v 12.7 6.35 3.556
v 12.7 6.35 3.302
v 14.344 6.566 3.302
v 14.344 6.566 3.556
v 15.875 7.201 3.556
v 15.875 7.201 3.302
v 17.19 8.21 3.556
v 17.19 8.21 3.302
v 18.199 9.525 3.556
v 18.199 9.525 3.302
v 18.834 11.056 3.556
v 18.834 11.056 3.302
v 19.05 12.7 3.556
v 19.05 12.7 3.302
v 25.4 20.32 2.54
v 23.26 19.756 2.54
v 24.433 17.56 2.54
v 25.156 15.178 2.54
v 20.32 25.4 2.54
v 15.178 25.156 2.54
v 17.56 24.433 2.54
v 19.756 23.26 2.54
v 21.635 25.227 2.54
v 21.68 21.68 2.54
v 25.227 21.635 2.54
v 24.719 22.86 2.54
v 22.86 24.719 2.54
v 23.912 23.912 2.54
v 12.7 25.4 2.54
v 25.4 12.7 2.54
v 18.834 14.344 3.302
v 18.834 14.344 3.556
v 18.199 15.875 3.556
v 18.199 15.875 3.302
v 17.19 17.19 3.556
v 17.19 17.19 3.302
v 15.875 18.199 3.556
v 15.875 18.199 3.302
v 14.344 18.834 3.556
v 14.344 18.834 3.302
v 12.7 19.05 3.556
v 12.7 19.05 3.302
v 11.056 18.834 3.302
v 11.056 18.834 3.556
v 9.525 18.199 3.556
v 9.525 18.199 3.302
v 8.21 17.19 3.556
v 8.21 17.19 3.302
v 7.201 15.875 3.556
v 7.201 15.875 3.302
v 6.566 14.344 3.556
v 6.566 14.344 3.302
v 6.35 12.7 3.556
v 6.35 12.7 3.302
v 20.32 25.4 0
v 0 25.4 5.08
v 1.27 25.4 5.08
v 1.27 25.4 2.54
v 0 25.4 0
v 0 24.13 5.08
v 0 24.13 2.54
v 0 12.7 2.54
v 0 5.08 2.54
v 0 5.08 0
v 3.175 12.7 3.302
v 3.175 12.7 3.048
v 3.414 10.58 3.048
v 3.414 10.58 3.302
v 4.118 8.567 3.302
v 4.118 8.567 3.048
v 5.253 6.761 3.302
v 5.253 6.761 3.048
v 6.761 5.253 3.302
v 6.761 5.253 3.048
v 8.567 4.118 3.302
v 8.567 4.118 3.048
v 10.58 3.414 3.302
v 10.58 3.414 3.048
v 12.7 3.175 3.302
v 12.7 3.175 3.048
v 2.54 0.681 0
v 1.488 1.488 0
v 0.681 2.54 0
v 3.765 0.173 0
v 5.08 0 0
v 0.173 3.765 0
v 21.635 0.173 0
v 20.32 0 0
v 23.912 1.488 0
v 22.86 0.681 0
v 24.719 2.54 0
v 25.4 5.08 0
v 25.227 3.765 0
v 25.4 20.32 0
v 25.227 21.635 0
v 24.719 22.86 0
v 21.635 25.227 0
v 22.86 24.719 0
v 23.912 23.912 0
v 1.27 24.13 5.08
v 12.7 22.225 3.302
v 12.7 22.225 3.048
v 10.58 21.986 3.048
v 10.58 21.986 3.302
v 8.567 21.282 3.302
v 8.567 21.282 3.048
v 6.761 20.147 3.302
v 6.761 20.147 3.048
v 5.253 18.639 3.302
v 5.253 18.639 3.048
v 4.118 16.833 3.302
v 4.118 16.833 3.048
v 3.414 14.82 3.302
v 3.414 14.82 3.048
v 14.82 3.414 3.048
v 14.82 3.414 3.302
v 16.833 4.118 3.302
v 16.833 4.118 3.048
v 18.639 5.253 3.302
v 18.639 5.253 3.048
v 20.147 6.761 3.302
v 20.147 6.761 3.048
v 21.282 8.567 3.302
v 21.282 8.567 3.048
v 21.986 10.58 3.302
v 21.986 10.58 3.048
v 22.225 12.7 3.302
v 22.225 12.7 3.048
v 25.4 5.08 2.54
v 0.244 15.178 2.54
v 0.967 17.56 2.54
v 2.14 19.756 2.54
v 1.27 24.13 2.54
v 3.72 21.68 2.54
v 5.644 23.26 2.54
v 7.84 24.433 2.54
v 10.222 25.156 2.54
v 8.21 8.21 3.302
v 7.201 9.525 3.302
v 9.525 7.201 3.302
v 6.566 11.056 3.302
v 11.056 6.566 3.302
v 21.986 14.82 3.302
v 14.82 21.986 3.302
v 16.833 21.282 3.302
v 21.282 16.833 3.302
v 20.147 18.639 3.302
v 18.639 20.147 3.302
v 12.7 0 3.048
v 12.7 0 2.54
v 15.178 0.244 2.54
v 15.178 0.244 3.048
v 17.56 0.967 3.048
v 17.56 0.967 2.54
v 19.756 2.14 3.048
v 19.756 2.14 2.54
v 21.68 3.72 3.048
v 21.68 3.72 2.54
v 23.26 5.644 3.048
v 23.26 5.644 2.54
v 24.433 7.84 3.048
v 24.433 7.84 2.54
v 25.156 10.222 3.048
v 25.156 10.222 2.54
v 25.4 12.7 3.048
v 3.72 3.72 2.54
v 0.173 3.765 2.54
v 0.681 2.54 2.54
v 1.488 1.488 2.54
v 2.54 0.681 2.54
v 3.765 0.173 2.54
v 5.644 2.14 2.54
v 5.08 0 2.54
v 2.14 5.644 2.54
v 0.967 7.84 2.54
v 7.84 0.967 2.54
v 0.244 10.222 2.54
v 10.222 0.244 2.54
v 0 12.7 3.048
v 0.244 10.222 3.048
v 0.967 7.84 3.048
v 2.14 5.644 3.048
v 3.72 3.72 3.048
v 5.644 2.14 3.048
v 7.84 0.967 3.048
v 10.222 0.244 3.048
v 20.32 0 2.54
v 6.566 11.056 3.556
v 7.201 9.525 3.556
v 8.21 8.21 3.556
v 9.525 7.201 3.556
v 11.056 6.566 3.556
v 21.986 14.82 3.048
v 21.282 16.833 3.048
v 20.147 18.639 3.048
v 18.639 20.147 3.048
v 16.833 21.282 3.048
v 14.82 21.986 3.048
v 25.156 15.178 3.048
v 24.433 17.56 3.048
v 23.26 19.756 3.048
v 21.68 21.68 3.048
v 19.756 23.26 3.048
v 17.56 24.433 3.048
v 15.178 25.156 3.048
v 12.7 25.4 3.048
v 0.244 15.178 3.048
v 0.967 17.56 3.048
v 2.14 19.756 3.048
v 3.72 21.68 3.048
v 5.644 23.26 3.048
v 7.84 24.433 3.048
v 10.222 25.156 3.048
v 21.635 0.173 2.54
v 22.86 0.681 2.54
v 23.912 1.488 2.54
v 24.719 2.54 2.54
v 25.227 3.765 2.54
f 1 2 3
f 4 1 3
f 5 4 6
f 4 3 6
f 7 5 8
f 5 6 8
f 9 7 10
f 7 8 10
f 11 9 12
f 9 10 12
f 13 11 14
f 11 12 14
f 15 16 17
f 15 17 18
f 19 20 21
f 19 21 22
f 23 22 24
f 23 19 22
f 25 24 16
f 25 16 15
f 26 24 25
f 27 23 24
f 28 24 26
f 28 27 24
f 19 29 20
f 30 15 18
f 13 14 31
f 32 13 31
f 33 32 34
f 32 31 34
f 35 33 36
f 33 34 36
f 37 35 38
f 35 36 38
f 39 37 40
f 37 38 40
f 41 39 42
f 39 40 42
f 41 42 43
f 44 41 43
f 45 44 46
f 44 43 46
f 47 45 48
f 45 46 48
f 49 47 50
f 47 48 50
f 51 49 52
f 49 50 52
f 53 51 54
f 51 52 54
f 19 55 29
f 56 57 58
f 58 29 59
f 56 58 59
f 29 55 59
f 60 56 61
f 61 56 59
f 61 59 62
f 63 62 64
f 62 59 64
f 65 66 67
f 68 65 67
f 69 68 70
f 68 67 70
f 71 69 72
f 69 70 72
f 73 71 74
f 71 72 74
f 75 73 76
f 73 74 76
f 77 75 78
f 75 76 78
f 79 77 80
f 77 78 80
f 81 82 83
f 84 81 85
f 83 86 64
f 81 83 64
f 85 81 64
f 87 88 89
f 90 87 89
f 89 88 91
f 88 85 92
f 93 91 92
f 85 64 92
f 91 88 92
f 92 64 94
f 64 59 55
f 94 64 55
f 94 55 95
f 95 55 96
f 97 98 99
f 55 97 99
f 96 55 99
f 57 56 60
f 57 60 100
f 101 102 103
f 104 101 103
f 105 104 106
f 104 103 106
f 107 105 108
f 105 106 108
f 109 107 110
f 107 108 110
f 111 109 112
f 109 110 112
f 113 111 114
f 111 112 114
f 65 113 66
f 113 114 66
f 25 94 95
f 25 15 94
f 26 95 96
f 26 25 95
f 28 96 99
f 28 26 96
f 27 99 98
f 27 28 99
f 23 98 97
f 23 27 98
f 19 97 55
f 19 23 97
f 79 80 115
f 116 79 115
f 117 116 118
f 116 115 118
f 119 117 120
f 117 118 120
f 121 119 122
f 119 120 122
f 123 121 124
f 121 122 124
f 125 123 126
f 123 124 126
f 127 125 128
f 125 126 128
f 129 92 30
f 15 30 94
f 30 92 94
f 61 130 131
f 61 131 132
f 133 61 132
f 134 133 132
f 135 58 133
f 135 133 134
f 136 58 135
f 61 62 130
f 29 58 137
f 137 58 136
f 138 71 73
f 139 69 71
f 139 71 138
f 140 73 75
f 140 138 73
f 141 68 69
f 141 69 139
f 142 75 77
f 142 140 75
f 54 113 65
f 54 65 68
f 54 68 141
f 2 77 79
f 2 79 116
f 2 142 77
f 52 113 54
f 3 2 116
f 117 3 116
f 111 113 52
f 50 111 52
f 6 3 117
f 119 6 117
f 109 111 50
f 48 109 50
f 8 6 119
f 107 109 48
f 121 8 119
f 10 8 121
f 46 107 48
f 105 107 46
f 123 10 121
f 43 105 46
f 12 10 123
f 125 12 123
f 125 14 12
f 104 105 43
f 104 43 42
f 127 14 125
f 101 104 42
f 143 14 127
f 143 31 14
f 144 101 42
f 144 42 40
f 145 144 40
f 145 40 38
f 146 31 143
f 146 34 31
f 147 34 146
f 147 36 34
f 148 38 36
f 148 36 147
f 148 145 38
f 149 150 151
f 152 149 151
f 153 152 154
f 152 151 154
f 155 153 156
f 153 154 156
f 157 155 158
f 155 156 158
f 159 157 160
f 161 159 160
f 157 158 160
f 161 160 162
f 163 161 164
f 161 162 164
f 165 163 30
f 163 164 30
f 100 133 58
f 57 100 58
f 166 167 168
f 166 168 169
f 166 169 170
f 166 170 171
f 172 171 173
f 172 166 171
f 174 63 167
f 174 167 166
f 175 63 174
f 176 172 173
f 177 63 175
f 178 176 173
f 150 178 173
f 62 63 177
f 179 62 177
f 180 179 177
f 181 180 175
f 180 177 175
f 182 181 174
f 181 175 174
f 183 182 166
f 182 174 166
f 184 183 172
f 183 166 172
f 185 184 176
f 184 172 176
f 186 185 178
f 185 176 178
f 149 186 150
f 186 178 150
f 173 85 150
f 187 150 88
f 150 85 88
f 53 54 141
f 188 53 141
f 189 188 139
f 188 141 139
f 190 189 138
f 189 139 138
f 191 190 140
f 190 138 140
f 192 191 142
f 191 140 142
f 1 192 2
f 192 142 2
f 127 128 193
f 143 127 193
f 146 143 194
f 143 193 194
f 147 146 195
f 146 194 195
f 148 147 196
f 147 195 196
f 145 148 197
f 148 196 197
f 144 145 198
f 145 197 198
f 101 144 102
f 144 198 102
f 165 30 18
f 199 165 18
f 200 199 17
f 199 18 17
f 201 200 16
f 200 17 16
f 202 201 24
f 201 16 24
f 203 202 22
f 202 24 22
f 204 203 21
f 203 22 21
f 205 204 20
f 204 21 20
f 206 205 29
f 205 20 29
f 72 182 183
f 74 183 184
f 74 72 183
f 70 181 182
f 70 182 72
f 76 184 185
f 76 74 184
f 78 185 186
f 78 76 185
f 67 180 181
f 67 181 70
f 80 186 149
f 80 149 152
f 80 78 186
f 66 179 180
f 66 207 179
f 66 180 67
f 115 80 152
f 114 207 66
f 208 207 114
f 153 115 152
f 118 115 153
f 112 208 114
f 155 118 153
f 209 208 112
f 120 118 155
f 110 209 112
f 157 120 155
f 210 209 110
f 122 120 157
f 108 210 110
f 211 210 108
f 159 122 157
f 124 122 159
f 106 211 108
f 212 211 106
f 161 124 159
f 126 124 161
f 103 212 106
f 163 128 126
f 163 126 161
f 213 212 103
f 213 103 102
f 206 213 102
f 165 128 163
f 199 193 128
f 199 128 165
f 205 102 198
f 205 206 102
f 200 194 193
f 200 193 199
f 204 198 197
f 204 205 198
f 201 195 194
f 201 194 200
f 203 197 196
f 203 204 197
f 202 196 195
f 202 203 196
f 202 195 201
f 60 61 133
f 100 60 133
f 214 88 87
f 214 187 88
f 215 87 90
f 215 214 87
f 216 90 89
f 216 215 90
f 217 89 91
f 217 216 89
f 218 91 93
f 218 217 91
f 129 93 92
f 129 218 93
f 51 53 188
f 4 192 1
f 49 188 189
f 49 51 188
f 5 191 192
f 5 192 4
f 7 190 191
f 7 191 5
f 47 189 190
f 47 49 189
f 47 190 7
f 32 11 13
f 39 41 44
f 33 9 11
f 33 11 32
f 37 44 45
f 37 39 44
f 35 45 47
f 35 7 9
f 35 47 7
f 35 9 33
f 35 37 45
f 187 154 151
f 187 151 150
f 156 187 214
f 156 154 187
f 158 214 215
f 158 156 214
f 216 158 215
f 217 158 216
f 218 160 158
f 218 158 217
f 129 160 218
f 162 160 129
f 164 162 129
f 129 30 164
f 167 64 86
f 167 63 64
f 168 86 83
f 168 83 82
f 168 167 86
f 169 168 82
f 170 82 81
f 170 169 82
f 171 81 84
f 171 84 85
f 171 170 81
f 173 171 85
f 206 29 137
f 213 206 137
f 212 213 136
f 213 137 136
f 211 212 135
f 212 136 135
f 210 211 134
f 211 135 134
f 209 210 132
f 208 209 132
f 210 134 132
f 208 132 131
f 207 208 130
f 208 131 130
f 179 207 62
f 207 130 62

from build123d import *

# Parameters (mm, degrees)
F1_DEPTH = 2.54
F0_W     = 1.27
F0_H     = 1.27
F2_DEPTH = 3.048
F3_DEPTH = 5.08
F4_DEPTH = 3.302
F5_DEPTH = 3.556
F6_R     = 5.08


with BuildPart() as f1:
    # F0 (on Top) → F1 (new body)
    with BuildSketch(Plane.XY):
        with BuildLine():
            Line((0, 12.7), (0, 0))
            Line((0, 0), (12.7, 0))
            ThreePointArc((12.7, 0), (3.7197438789, 3.7197438789), (0, 12.7))
        make_face()
    extrude(amount=F1_DEPTH)



with BuildPart() as f1b:
    # F0 (on Top) → F1, piece 2 (new body)
    with BuildSketch(Plane.XY):
        with Locations((0.635, 24.765)):
            Rectangle(F0_W, F0_H)
        with BuildLine():
            Line((0, 24.13), (0, 12.7))
            ThreePointArc((0, 12.7), (3.7197438789, 21.6802561211), (12.7, 25.4))
            Line((12.7, 25.4), (1.27, 25.4))
            Line((1.27, 25.4), (1.27, 24.13))
            Line((1.27, 24.13), (0, 24.13))
        make_face()
    extrude(amount=F1_DEPTH)


with BuildPart() as f1c:
    # F0 (on Top) → F1, piece 3 (new body)
    with BuildSketch(Plane.XY):
        with BuildLine():
            Line((25.4, 25.4), (12.7, 25.4))
            ThreePointArc((12.7, 25.4), (21.6802561211, 21.6802561211), (25.4, 12.7))
            Line((25.4, 12.7), (25.4, 25.4))
        make_face()
    extrude(amount=F1_DEPTH)


with BuildPart() as f1d:
    # F0 (on Top) → F1, piece 4 (new body)
    with BuildSketch(Plane.XY):
        with BuildLine():
            ThreePointArc((25.4, 12.7), (21.6802561211, 3.7197438789), (12.7, 0))
            Line((12.7, 0), (25.4, 0))
            Line((25.4, 0), (25.4, 12.7))
        make_face()
    extrude(amount=F1_DEPTH)


with BuildPart() as f1_1:
    add(f1.part)

    add(f1b.part)  # F2 merges F1b

    add(f1c.part)  # F2 merges F1c

    add(f1d.part)  # F2 merges F1d
    # F0 (on Top) → F2 (join)
    with BuildSketch(Plane.XY):
        with BuildLine():
            Line((3.175, 12.7), (0, 12.7))
            ThreePointArc((0, 12.7), (3.7197438789, 3.7197438789), (12.7, 0))
            Line((12.7, 0), (12.7, 3.175))
            ThreePointArc((12.7, 3.175), (5.9648079092, 5.9648079092), (3.175, 12.7))
        make_face()
        with BuildLine():
            ThreePointArc((25.4, 12.7), (21.6802561211, 21.6802561211), (12.7, 25.4))
            Line((12.7, 25.4), (12.7, 22.225))
            ThreePointArc((12.7, 22.225), (19.4351920908, 19.4351920908), (22.225, 12.7))
            Line((22.225, 12.7), (25.4, 12.7))
        make_face()
        with BuildLine():
            Line((12.7, 3.175), (12.7, 0))
            ThreePointArc((12.7, 0), (21.6802561211, 3.7197438789), (25.4, 12.7))
            Line((25.4, 12.7), (22.225, 12.7))
            ThreePointArc((22.225, 12.7), (19.4351920908, 5.9648079092), (12.7, 3.175))
        make_face()
        with BuildLine():
            ThreePointArc((12.7, 25.4), (3.7197438789, 21.6802561211), (0, 12.7))
            Line((0, 12.7), (3.175, 12.7))
            ThreePointArc((3.175, 12.7), (5.9648079092, 19.4351920908), (12.7, 22.225))
            Line((12.7, 22.225), (12.7, 25.4))
        make_face()
    extrude(amount=F2_DEPTH)

    # F0 (on Top) → F3 (join)
    with BuildSketch(Plane.XY):
        with Locations((0.635, 24.765)):
            Rectangle(F0_W, F0_H)
    extrude(amount=F3_DEPTH)

    # F0 (on Top) → F4 (join)
    with BuildSketch(Plane.XY):
        with BuildLine():
            ThreePointArc((12.7, 22.225), (5.9648079092, 19.4351920908), (3.175, 12.7))
            Line((3.175, 12.7), (6.35, 12.7))
            ThreePointArc((6.35, 12.7), (8.2098719395, 17.1901280605), (12.7, 19.05))
            Line((12.7, 19.05), (12.7, 22.225))
        make_face()
        with BuildLine():
            ThreePointArc((22.225, 12.7), (19.4351920908, 19.4351920908), (12.7, 22.225))
            Line((12.7, 22.225), (12.7, 19.05))
            ThreePointArc((12.7, 19.05), (17.1901280605, 17.1901280605), (19.05, 12.7))
            Line((19.05, 12.7), (22.225, 12.7))
        make_face()
        with BuildLine():
            Line((6.35, 12.7), (3.175, 12.7))
            ThreePointArc((3.175, 12.7), (5.9648079092, 5.9648079092), (12.7, 3.175))
            Line((12.7, 3.175), (12.7, 6.35))
            ThreePointArc((12.7, 6.35), (8.2098719395, 8.2098719395), (6.35, 12.7))
        make_face()
        with BuildLine():
            Line((12.7, 6.35), (12.7, 3.175))
            ThreePointArc((12.7, 3.175), (19.4351920908, 5.9648079092), (22.225, 12.7))
            Line((22.225, 12.7), (19.05, 12.7))
            ThreePointArc((19.05, 12.7), (17.1901280605, 8.2098719395), (12.7, 6.35))
        make_face()
    extrude(amount=F4_DEPTH)

    # F0 (on Top) → F5 (join)
    with BuildSketch(Plane.XY):
        with BuildLine():
            ThreePointArc((12.7, 19.05), (8.2098719395, 17.1901280605), (6.35, 12.7))
            Line((6.35, 12.7), (12.7, 12.7))
            Line((12.7, 12.7), (12.7, 19.05))
        make_face()
        with BuildLine():
            Line((12.7, 12.7), (6.35, 12.7))
            ThreePointArc((6.35, 12.7), (8.2098719395, 8.2098719395), (12.7, 6.35))
            Line((12.7, 6.35), (12.7, 12.7))
        make_face()
        with BuildLine():
            Line((12.7, 19.05), (12.7, 12.7))
            Line((12.7, 12.7), (19.05, 12.7))
            ThreePointArc((19.05, 12.7), (17.1901280605, 17.1901280605), (12.7, 19.05))
        make_face()
        with BuildLine():
            Line((12.7, 12.7), (12.7, 6.35))
            ThreePointArc((12.7, 6.35), (17.1901280605, 8.2098719395), (19.05, 12.7))
            Line((19.05, 12.7), (12.7, 12.7))
        make_face()
    extrude(amount=F5_DEPTH)

    # F6
    f6_edges = [f1_1.edges().sort_by_distance(p)[0] for p in [
        (0, 0, 1.27),
        (25.4, 25.4, 1.27),
        (25.4, 0, 1.27),
    ]]
    fillet(f6_edges, radius=F6_R)


solid = f1_1.part
